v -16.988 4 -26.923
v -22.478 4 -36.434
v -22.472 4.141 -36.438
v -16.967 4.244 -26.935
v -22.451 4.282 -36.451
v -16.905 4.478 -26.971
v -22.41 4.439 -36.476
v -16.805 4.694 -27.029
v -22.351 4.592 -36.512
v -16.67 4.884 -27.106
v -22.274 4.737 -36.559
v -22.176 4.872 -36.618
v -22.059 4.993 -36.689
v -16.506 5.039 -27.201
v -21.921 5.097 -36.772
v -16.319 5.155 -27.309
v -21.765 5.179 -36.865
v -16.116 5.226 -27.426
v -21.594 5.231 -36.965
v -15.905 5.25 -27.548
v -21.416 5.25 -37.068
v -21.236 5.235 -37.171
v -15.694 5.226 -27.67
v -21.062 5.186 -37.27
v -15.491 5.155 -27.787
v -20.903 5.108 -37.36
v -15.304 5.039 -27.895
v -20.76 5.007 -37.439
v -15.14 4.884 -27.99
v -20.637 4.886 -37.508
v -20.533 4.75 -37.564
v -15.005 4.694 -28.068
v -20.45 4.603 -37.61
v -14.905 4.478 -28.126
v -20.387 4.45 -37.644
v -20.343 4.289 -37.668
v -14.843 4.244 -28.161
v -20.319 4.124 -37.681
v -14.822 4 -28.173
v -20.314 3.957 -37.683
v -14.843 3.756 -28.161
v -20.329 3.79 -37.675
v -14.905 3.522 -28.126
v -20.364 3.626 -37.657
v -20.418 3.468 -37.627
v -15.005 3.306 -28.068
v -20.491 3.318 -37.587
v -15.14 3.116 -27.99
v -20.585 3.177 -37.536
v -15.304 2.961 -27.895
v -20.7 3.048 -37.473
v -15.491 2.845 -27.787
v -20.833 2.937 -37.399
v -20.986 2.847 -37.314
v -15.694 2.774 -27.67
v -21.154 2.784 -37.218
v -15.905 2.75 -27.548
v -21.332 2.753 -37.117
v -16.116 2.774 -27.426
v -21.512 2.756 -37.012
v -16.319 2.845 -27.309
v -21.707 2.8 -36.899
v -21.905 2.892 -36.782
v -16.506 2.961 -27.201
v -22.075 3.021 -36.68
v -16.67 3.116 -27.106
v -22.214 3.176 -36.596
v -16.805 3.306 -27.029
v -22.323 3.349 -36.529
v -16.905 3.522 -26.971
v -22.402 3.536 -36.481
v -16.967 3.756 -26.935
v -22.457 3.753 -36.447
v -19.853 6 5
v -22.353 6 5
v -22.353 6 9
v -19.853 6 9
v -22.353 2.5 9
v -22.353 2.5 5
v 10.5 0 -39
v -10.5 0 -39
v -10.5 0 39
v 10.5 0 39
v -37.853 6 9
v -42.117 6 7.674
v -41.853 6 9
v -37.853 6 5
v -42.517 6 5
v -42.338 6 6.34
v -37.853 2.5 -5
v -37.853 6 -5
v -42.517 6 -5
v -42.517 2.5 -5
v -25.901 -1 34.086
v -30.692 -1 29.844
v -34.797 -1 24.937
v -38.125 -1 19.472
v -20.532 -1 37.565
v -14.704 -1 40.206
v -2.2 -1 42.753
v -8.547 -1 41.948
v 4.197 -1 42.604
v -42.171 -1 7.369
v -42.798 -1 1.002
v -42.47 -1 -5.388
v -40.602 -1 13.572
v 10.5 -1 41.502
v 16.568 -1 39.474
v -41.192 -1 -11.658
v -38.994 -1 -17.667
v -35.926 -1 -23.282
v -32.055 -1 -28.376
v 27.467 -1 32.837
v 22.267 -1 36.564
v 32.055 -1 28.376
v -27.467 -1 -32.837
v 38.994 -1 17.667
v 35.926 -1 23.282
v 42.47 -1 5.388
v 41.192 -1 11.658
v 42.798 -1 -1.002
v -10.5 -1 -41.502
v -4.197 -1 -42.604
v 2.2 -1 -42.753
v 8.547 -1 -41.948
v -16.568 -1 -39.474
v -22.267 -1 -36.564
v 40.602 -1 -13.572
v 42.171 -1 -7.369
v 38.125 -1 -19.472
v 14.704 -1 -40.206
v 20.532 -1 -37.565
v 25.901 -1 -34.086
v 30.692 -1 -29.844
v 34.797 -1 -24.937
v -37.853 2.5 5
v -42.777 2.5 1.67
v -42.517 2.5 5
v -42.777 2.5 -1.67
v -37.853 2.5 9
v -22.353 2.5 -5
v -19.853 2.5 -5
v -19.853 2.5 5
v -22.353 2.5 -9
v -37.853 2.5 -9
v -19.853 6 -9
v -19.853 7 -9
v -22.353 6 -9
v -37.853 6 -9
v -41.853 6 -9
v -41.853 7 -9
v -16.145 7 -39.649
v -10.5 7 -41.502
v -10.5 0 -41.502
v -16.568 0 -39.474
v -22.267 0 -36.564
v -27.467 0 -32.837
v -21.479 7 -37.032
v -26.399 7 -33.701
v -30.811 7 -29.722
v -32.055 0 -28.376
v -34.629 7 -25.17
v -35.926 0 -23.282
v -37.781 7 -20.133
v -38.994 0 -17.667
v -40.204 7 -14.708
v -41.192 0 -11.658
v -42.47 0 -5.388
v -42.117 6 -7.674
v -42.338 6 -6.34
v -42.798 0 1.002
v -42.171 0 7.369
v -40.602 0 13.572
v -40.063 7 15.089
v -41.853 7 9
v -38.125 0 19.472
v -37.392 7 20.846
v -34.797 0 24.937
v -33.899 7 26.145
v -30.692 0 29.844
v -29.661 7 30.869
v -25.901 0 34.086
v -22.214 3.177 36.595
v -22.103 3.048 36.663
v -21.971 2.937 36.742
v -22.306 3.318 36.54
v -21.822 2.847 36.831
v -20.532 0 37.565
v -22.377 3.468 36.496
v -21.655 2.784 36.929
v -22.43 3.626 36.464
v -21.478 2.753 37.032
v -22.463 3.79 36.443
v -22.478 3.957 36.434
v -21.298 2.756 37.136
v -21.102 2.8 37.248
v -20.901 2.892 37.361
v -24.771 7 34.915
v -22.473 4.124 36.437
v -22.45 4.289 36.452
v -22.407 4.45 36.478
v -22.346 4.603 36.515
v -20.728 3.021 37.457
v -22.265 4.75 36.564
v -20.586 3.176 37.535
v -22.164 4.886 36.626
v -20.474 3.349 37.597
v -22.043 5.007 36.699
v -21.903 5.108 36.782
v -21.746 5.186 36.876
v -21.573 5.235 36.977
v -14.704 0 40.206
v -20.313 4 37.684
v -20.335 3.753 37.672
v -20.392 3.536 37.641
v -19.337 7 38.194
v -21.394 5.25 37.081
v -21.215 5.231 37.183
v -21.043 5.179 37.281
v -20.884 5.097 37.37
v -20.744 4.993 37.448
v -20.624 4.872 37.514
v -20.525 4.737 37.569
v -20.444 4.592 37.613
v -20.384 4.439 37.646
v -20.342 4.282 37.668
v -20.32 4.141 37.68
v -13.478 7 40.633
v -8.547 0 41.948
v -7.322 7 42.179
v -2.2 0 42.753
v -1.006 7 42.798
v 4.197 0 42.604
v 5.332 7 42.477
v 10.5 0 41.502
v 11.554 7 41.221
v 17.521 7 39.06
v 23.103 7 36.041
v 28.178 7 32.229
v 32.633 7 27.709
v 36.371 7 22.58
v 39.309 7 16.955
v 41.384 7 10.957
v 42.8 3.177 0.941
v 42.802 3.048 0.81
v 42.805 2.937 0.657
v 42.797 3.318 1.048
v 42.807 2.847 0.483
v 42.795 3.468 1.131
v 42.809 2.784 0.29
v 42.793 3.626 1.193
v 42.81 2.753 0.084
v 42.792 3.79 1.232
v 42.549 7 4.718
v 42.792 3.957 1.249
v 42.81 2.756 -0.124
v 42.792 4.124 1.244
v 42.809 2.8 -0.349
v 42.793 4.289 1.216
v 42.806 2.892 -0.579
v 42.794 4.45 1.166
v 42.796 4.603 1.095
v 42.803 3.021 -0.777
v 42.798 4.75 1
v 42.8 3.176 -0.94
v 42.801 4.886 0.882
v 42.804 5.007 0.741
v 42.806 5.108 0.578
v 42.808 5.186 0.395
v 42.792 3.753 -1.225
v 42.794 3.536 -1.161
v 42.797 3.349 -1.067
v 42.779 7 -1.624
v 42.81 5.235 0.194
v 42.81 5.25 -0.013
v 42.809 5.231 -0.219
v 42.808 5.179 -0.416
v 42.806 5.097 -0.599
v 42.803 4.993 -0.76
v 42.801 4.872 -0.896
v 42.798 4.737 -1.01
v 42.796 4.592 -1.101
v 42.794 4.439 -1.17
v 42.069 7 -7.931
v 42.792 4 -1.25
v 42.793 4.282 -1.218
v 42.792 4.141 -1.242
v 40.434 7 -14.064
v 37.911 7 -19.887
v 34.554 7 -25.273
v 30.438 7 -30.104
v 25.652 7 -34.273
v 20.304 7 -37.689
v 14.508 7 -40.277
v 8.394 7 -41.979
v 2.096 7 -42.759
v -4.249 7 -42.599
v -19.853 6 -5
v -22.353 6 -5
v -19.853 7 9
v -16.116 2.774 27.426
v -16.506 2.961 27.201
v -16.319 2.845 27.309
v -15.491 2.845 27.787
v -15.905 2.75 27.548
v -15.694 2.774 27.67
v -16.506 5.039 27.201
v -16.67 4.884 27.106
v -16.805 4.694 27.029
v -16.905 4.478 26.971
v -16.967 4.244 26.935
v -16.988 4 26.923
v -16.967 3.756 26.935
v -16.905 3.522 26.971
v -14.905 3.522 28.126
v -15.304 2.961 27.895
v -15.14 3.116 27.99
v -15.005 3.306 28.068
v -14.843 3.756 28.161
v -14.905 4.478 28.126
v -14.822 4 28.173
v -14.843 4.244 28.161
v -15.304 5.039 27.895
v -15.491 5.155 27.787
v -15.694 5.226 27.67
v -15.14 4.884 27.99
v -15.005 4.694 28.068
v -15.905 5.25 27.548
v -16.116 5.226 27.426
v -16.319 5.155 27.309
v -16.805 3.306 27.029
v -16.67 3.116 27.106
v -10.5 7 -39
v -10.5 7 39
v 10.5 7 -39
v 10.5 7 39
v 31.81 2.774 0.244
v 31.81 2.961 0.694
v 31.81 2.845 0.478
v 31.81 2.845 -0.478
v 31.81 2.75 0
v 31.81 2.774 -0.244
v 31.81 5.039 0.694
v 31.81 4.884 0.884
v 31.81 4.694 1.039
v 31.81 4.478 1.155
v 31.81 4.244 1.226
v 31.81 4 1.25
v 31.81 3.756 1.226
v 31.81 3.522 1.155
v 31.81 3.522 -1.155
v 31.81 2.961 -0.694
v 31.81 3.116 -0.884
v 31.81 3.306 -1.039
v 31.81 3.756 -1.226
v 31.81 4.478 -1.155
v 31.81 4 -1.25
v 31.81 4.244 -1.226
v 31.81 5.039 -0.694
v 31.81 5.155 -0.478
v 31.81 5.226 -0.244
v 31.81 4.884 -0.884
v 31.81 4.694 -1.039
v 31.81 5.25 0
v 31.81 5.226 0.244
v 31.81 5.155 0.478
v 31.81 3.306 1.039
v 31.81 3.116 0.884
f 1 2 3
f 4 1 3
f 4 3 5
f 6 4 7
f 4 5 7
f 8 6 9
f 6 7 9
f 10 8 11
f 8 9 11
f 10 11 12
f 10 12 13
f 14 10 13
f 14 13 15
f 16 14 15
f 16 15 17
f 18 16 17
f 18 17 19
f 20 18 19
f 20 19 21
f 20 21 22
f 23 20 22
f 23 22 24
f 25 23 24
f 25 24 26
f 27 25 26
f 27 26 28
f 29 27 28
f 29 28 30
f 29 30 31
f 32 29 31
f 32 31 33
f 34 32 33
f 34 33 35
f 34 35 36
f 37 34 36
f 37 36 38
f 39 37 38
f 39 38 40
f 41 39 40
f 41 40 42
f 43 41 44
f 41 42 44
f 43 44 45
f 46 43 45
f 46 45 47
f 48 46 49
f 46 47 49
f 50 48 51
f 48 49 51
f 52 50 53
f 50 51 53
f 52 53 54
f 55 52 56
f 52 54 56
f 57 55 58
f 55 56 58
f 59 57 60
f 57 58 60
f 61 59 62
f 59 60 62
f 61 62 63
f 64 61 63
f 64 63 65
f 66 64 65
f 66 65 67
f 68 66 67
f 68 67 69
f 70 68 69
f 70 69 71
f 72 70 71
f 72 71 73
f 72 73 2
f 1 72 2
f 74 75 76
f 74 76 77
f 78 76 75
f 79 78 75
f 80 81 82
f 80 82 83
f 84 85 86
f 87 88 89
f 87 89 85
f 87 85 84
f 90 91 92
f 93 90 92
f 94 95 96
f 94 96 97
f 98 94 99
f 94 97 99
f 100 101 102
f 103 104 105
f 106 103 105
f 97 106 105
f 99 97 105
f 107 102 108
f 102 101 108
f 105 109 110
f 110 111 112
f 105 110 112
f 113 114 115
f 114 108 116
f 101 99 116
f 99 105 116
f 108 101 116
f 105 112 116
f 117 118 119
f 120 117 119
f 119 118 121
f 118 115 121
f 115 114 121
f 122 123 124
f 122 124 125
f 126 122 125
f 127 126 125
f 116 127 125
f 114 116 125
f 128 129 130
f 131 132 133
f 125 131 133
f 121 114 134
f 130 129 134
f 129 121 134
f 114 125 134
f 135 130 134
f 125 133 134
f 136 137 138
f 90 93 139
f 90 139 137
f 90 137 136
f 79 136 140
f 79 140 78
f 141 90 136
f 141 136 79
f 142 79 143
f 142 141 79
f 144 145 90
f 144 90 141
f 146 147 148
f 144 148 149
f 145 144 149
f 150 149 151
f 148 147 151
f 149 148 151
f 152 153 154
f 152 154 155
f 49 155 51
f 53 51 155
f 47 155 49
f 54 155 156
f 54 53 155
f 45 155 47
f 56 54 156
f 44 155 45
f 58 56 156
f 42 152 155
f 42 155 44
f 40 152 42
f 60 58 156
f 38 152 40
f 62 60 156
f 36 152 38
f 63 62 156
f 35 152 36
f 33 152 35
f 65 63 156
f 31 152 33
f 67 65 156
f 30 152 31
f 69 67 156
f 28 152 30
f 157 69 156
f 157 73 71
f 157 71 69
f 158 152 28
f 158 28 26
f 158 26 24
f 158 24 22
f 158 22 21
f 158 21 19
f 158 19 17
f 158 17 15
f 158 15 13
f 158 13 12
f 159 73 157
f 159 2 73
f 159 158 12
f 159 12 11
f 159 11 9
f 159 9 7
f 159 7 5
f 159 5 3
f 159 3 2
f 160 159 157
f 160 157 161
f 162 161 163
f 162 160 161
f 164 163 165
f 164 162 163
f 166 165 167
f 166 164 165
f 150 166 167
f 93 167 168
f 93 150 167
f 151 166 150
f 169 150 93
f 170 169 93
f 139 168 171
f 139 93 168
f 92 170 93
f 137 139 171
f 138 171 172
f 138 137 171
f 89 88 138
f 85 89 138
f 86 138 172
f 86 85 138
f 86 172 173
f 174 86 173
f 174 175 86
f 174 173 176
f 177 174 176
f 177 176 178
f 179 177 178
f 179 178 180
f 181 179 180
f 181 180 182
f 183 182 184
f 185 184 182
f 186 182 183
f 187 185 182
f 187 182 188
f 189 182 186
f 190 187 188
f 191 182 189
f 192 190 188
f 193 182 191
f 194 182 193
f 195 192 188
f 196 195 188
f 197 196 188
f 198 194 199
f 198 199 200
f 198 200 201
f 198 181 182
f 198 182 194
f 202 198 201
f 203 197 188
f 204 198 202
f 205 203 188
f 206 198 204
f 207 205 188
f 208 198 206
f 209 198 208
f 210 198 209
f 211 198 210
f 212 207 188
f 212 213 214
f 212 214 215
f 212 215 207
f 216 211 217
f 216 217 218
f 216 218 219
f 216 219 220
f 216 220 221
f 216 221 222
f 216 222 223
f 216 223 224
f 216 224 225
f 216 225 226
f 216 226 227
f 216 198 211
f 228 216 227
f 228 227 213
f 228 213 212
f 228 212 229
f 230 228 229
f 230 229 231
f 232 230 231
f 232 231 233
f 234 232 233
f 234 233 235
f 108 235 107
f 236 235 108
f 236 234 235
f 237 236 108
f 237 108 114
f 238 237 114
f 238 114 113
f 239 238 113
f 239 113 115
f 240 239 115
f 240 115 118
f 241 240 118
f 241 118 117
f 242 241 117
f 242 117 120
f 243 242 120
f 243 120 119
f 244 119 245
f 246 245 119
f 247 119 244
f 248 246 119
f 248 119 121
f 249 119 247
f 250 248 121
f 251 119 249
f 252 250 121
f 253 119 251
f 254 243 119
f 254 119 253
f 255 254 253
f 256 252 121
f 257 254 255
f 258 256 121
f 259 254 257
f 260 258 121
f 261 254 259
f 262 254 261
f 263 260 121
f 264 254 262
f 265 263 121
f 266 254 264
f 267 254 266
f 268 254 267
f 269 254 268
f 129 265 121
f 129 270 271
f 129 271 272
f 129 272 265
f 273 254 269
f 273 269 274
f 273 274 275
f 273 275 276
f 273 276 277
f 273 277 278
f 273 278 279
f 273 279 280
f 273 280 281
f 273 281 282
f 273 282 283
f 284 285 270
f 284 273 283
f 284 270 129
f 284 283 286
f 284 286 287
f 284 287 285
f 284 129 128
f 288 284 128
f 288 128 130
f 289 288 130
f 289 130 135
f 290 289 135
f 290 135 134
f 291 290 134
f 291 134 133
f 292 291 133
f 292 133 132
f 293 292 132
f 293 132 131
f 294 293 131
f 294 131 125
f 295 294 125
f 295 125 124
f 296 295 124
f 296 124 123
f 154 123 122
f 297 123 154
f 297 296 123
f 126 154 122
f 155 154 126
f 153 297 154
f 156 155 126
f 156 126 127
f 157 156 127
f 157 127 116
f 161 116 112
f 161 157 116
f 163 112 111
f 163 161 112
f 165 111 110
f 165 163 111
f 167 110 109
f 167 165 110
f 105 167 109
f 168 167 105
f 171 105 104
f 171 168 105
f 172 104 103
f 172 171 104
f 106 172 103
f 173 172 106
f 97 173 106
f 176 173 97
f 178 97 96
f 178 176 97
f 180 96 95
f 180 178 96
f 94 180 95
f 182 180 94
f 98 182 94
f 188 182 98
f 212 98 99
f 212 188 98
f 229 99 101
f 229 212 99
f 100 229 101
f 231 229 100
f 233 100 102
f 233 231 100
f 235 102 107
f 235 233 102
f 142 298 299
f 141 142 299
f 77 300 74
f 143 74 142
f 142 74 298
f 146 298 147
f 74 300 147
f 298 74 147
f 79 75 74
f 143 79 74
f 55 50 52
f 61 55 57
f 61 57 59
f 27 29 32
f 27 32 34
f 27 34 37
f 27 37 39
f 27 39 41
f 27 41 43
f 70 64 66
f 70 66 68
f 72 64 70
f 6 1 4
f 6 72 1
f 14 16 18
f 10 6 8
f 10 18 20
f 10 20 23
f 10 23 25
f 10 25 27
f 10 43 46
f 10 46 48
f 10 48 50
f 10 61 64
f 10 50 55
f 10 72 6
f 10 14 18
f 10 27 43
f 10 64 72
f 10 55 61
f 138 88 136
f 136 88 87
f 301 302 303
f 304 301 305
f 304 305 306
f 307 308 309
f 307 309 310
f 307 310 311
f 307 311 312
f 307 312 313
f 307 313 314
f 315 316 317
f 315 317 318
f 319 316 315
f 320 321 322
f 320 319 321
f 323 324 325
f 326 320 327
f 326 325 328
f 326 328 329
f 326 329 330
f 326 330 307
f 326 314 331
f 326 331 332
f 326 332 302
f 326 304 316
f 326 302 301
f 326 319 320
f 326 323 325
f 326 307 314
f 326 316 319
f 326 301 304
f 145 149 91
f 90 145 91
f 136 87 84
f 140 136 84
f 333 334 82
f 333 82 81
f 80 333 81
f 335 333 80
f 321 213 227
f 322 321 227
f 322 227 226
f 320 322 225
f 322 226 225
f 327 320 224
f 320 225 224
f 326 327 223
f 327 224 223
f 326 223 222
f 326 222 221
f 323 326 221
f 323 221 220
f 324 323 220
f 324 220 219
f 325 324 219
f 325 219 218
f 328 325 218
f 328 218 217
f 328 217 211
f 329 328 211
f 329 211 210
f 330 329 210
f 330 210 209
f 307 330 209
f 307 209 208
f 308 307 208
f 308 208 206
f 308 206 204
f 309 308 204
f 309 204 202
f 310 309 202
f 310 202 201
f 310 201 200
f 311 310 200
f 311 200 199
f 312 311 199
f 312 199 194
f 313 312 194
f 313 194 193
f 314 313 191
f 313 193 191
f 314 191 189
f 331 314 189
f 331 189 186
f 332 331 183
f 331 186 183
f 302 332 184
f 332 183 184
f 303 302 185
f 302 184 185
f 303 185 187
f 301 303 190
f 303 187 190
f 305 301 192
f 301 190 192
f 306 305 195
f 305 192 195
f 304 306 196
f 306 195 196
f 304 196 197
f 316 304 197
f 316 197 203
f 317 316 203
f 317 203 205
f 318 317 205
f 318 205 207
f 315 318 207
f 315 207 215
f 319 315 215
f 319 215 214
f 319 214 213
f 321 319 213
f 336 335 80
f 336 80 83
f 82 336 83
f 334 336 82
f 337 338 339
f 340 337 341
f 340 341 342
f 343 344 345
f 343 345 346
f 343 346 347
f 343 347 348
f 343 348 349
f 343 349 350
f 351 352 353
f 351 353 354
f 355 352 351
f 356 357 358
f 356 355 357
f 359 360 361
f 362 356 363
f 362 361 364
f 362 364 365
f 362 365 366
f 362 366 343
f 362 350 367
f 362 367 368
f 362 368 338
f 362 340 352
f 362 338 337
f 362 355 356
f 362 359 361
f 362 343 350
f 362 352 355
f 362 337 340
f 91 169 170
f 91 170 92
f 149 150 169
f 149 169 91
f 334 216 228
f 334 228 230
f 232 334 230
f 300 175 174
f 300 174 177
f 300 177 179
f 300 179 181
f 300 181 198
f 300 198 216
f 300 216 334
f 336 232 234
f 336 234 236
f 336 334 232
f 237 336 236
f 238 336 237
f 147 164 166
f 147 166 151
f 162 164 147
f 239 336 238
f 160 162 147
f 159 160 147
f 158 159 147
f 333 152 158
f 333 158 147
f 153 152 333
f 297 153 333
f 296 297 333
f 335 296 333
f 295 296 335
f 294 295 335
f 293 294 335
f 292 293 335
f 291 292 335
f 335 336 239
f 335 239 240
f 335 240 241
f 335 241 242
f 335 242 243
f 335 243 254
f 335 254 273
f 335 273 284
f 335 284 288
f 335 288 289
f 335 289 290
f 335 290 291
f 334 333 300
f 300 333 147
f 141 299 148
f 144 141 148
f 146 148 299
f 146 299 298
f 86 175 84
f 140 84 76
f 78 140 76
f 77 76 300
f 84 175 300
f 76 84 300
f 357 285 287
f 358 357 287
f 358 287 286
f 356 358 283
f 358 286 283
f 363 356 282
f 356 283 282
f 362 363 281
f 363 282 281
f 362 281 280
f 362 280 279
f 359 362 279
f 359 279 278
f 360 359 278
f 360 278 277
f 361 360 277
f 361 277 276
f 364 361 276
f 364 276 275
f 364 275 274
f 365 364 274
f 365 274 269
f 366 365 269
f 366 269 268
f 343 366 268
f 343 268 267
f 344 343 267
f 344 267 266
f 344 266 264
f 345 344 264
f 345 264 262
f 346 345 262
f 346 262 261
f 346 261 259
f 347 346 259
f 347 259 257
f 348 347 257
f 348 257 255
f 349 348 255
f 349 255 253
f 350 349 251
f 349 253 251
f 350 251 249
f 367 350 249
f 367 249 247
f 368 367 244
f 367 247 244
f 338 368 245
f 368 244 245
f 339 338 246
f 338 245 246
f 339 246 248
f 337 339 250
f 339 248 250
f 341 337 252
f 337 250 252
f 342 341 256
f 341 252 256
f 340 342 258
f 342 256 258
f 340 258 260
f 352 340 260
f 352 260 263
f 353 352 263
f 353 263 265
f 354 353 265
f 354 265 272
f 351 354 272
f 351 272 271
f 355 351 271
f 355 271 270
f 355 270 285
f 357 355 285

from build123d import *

# Parameters (mm, degrees)
SKETCH1_R           = 42.81
BOSS_EXTRUDE1_DEPTH = 1
BOSS_EXTRUDE2_START = 7
BOSS_EXTRUDE2_DEPTH = 7
SKETCH2_W           = 2.5
SKETCH2_H           = 4
CUT_EXTRUDE1_DEPTH  = 1
CUT_EXTRUDE2_DEPTH  = 4.5
BOSS_EXTRUDE3_START = 7
BOSS_EXTRUDE3_DEPTH = 7
SKETCH4_R           = 1.25
CUT_EXTRUDE3_DEPTH  = 11
CIRPATTERN1_COUNT   = 3


with BuildPart() as part:
    # Sketch1 → Boss-Extrude1 (new body)
    with BuildSketch(Plane(origin=(0, 0, 0), x_dir=(1, 0, 0), z_dir=(0, 1, 0))):
        Circle(SKETCH1_R)
    extrude(amount=-BOSS_EXTRUDE1_DEPTH)

    # Sketch1<3> → Boss-Extrude2 (add)
    with BuildSketch(Plane(origin=(0, 0, 0), x_dir=(1, 0, 0), z_dir=(0, 1, 0)).offset(BOSS_EXTRUDE2_START)):
        with BuildLine():
            ThreePointArc((-10.5, 41.502362583), (-42.81, 0), (-10.5, -41.502362583))
            Line((-10.5, -41.502362583), (-10.5, 41.502362583))
        make_face()
        with BuildLine():
            Line((10.5, 41.502362583), (10.5, -41.502362583))
            ThreePointArc((10.5, -41.502362583), (42.81, 0), (10.5, 41.502362583))
        make_face()
    extrude(amount=-BOSS_EXTRUDE2_DEPTH)

    # Sketch2 → Cut-Extrude1 (cut)
    with BuildSketch(Plane(origin=(0, 7, 0), x_dir=(1, 0, 0), z_dir=(0, 1, 0))):
        with BuildLine():
            Line((-37.85326869, 9), (-41.85326869, 9))
            ThreePointArc((-41.85326869, 9), (-42.232522563, 7.007862583), (-42.517009537, 5))
            Line((-42.517009537, 5), (-37.85326869, 5))
            Line((-37.85326869, 5), (-37.85326869, 9))
        make_face()
        with Locations((-21.10326869, 7)):
            Rectangle(SKETCH2_W, SKETCH2_H)
        with BuildLine():
            Line((-37.85326869, -5), (-42.517009537, -5))
            ThreePointArc((-42.517009537, -5), (-42.232522563, -7.007862583), (-41.85326869, -9))
            Line((-41.85326869, -9), (-37.85326869, -9))
            Line((-37.85326869, -9), (-37.85326869, -5))
        make_face()
        with Locations((-21.10326869, -7)):
            Rectangle(SKETCH2_W, SKETCH2_H)
    extrude(amount=-CUT_EXTRUDE1_DEPTH, mode=Mode.SUBTRACT)

    # Sketch2<3> → Cut-Extrude2 (cut)
    with BuildSketch(Plane(origin=(0, 7, 0), x_dir=(1, 0, 0), z_dir=(0, 1, 0))):
        with BuildLine():
            Line((-22.35326869, 9), (-37.85326869, 9))
            Line((-37.85326869, 9), (-37.85326869, 5))
            Line((-37.85326869, 5), (-42.517009537, 5))
            ThreePointArc((-42.517009537, 5), (-42.81, 0), (-42.517009537, -5))
            Line((-42.517009537, -5), (-37.85326869, -5))
            Line((-37.85326869, -5), (-37.85326869, -9))
            Line((-37.85326869, -9), (-22.35326869, -9))
            Line((-22.35326869, -9), (-22.35326869, -5))
            Line((-22.35326869, -5), (-19.85326869, -5))
            Line((-19.85326869, -5), (-19.85326869, 5))
            Line((-19.85326869, 5), (-22.35326869, 5))
            Line((-22.35326869, 5), (-22.35326869, 9))
        make_face()
    extrude(amount=-CUT_EXTRUDE2_DEPTH, mode=Mode.SUBTRACT)

    # Sketch3 → Boss-Extrude3 (add)
    with BuildSketch(Plane(origin=(0, 0, 0), x_dir=(1, 0, 0), z_dir=(0, 1, 0)).offset(BOSS_EXTRUDE3_START)):
        with BuildLine():
            Line((-10.5, 41.502362583), (-10.5, 39))
            Line((-10.5, 39), (10.5, 39))
            Line((10.5, 39), (10.5, 41.502362583))
            ThreePointArc((10.5, 41.502362583), (0, 42.81), (-10.5, 41.502362583))
        make_face()
        with BuildLine():
            Line((10.5, -39), (-10.5, -39))
            Line((-10.5, -39), (-10.5, -41.502362583))
            ThreePointArc((-10.5, -41.502362583), (0, -42.81), (10.5, -41.502362583))
            Line((10.5, -41.502362583), (10.5, -39))
        make_face()
    extrude(amount=-BOSS_EXTRUDE3_DEPTH)

    # Sketch4 → Cut-Extrude3 (cut)
    with BuildSketch(Plane(origin=(42.81, 0, 0), x_dir=(0, 0, -1), z_dir=(1, 0, 0))):
        with Locations((0, 4)):
            Circle(SKETCH4_R)
    cut_extrude3 = extrude(amount=-CUT_EXTRUDE3_DEPTH, mode=Mode.SUBTRACT)

    # CirPattern1: Cut-Extrude3 ×3 about axis
    cirpattern1_axis = Axis((0, 7, 0), (0, 1, 0))
    for i in range(1, CIRPATTERN1_COUNT):
        add(cut_extrude3.rotate(cirpattern1_axis, i * 360 / CIRPATTERN1_COUNT), mode=Mode.SUBTRACT)


solid = part.part
